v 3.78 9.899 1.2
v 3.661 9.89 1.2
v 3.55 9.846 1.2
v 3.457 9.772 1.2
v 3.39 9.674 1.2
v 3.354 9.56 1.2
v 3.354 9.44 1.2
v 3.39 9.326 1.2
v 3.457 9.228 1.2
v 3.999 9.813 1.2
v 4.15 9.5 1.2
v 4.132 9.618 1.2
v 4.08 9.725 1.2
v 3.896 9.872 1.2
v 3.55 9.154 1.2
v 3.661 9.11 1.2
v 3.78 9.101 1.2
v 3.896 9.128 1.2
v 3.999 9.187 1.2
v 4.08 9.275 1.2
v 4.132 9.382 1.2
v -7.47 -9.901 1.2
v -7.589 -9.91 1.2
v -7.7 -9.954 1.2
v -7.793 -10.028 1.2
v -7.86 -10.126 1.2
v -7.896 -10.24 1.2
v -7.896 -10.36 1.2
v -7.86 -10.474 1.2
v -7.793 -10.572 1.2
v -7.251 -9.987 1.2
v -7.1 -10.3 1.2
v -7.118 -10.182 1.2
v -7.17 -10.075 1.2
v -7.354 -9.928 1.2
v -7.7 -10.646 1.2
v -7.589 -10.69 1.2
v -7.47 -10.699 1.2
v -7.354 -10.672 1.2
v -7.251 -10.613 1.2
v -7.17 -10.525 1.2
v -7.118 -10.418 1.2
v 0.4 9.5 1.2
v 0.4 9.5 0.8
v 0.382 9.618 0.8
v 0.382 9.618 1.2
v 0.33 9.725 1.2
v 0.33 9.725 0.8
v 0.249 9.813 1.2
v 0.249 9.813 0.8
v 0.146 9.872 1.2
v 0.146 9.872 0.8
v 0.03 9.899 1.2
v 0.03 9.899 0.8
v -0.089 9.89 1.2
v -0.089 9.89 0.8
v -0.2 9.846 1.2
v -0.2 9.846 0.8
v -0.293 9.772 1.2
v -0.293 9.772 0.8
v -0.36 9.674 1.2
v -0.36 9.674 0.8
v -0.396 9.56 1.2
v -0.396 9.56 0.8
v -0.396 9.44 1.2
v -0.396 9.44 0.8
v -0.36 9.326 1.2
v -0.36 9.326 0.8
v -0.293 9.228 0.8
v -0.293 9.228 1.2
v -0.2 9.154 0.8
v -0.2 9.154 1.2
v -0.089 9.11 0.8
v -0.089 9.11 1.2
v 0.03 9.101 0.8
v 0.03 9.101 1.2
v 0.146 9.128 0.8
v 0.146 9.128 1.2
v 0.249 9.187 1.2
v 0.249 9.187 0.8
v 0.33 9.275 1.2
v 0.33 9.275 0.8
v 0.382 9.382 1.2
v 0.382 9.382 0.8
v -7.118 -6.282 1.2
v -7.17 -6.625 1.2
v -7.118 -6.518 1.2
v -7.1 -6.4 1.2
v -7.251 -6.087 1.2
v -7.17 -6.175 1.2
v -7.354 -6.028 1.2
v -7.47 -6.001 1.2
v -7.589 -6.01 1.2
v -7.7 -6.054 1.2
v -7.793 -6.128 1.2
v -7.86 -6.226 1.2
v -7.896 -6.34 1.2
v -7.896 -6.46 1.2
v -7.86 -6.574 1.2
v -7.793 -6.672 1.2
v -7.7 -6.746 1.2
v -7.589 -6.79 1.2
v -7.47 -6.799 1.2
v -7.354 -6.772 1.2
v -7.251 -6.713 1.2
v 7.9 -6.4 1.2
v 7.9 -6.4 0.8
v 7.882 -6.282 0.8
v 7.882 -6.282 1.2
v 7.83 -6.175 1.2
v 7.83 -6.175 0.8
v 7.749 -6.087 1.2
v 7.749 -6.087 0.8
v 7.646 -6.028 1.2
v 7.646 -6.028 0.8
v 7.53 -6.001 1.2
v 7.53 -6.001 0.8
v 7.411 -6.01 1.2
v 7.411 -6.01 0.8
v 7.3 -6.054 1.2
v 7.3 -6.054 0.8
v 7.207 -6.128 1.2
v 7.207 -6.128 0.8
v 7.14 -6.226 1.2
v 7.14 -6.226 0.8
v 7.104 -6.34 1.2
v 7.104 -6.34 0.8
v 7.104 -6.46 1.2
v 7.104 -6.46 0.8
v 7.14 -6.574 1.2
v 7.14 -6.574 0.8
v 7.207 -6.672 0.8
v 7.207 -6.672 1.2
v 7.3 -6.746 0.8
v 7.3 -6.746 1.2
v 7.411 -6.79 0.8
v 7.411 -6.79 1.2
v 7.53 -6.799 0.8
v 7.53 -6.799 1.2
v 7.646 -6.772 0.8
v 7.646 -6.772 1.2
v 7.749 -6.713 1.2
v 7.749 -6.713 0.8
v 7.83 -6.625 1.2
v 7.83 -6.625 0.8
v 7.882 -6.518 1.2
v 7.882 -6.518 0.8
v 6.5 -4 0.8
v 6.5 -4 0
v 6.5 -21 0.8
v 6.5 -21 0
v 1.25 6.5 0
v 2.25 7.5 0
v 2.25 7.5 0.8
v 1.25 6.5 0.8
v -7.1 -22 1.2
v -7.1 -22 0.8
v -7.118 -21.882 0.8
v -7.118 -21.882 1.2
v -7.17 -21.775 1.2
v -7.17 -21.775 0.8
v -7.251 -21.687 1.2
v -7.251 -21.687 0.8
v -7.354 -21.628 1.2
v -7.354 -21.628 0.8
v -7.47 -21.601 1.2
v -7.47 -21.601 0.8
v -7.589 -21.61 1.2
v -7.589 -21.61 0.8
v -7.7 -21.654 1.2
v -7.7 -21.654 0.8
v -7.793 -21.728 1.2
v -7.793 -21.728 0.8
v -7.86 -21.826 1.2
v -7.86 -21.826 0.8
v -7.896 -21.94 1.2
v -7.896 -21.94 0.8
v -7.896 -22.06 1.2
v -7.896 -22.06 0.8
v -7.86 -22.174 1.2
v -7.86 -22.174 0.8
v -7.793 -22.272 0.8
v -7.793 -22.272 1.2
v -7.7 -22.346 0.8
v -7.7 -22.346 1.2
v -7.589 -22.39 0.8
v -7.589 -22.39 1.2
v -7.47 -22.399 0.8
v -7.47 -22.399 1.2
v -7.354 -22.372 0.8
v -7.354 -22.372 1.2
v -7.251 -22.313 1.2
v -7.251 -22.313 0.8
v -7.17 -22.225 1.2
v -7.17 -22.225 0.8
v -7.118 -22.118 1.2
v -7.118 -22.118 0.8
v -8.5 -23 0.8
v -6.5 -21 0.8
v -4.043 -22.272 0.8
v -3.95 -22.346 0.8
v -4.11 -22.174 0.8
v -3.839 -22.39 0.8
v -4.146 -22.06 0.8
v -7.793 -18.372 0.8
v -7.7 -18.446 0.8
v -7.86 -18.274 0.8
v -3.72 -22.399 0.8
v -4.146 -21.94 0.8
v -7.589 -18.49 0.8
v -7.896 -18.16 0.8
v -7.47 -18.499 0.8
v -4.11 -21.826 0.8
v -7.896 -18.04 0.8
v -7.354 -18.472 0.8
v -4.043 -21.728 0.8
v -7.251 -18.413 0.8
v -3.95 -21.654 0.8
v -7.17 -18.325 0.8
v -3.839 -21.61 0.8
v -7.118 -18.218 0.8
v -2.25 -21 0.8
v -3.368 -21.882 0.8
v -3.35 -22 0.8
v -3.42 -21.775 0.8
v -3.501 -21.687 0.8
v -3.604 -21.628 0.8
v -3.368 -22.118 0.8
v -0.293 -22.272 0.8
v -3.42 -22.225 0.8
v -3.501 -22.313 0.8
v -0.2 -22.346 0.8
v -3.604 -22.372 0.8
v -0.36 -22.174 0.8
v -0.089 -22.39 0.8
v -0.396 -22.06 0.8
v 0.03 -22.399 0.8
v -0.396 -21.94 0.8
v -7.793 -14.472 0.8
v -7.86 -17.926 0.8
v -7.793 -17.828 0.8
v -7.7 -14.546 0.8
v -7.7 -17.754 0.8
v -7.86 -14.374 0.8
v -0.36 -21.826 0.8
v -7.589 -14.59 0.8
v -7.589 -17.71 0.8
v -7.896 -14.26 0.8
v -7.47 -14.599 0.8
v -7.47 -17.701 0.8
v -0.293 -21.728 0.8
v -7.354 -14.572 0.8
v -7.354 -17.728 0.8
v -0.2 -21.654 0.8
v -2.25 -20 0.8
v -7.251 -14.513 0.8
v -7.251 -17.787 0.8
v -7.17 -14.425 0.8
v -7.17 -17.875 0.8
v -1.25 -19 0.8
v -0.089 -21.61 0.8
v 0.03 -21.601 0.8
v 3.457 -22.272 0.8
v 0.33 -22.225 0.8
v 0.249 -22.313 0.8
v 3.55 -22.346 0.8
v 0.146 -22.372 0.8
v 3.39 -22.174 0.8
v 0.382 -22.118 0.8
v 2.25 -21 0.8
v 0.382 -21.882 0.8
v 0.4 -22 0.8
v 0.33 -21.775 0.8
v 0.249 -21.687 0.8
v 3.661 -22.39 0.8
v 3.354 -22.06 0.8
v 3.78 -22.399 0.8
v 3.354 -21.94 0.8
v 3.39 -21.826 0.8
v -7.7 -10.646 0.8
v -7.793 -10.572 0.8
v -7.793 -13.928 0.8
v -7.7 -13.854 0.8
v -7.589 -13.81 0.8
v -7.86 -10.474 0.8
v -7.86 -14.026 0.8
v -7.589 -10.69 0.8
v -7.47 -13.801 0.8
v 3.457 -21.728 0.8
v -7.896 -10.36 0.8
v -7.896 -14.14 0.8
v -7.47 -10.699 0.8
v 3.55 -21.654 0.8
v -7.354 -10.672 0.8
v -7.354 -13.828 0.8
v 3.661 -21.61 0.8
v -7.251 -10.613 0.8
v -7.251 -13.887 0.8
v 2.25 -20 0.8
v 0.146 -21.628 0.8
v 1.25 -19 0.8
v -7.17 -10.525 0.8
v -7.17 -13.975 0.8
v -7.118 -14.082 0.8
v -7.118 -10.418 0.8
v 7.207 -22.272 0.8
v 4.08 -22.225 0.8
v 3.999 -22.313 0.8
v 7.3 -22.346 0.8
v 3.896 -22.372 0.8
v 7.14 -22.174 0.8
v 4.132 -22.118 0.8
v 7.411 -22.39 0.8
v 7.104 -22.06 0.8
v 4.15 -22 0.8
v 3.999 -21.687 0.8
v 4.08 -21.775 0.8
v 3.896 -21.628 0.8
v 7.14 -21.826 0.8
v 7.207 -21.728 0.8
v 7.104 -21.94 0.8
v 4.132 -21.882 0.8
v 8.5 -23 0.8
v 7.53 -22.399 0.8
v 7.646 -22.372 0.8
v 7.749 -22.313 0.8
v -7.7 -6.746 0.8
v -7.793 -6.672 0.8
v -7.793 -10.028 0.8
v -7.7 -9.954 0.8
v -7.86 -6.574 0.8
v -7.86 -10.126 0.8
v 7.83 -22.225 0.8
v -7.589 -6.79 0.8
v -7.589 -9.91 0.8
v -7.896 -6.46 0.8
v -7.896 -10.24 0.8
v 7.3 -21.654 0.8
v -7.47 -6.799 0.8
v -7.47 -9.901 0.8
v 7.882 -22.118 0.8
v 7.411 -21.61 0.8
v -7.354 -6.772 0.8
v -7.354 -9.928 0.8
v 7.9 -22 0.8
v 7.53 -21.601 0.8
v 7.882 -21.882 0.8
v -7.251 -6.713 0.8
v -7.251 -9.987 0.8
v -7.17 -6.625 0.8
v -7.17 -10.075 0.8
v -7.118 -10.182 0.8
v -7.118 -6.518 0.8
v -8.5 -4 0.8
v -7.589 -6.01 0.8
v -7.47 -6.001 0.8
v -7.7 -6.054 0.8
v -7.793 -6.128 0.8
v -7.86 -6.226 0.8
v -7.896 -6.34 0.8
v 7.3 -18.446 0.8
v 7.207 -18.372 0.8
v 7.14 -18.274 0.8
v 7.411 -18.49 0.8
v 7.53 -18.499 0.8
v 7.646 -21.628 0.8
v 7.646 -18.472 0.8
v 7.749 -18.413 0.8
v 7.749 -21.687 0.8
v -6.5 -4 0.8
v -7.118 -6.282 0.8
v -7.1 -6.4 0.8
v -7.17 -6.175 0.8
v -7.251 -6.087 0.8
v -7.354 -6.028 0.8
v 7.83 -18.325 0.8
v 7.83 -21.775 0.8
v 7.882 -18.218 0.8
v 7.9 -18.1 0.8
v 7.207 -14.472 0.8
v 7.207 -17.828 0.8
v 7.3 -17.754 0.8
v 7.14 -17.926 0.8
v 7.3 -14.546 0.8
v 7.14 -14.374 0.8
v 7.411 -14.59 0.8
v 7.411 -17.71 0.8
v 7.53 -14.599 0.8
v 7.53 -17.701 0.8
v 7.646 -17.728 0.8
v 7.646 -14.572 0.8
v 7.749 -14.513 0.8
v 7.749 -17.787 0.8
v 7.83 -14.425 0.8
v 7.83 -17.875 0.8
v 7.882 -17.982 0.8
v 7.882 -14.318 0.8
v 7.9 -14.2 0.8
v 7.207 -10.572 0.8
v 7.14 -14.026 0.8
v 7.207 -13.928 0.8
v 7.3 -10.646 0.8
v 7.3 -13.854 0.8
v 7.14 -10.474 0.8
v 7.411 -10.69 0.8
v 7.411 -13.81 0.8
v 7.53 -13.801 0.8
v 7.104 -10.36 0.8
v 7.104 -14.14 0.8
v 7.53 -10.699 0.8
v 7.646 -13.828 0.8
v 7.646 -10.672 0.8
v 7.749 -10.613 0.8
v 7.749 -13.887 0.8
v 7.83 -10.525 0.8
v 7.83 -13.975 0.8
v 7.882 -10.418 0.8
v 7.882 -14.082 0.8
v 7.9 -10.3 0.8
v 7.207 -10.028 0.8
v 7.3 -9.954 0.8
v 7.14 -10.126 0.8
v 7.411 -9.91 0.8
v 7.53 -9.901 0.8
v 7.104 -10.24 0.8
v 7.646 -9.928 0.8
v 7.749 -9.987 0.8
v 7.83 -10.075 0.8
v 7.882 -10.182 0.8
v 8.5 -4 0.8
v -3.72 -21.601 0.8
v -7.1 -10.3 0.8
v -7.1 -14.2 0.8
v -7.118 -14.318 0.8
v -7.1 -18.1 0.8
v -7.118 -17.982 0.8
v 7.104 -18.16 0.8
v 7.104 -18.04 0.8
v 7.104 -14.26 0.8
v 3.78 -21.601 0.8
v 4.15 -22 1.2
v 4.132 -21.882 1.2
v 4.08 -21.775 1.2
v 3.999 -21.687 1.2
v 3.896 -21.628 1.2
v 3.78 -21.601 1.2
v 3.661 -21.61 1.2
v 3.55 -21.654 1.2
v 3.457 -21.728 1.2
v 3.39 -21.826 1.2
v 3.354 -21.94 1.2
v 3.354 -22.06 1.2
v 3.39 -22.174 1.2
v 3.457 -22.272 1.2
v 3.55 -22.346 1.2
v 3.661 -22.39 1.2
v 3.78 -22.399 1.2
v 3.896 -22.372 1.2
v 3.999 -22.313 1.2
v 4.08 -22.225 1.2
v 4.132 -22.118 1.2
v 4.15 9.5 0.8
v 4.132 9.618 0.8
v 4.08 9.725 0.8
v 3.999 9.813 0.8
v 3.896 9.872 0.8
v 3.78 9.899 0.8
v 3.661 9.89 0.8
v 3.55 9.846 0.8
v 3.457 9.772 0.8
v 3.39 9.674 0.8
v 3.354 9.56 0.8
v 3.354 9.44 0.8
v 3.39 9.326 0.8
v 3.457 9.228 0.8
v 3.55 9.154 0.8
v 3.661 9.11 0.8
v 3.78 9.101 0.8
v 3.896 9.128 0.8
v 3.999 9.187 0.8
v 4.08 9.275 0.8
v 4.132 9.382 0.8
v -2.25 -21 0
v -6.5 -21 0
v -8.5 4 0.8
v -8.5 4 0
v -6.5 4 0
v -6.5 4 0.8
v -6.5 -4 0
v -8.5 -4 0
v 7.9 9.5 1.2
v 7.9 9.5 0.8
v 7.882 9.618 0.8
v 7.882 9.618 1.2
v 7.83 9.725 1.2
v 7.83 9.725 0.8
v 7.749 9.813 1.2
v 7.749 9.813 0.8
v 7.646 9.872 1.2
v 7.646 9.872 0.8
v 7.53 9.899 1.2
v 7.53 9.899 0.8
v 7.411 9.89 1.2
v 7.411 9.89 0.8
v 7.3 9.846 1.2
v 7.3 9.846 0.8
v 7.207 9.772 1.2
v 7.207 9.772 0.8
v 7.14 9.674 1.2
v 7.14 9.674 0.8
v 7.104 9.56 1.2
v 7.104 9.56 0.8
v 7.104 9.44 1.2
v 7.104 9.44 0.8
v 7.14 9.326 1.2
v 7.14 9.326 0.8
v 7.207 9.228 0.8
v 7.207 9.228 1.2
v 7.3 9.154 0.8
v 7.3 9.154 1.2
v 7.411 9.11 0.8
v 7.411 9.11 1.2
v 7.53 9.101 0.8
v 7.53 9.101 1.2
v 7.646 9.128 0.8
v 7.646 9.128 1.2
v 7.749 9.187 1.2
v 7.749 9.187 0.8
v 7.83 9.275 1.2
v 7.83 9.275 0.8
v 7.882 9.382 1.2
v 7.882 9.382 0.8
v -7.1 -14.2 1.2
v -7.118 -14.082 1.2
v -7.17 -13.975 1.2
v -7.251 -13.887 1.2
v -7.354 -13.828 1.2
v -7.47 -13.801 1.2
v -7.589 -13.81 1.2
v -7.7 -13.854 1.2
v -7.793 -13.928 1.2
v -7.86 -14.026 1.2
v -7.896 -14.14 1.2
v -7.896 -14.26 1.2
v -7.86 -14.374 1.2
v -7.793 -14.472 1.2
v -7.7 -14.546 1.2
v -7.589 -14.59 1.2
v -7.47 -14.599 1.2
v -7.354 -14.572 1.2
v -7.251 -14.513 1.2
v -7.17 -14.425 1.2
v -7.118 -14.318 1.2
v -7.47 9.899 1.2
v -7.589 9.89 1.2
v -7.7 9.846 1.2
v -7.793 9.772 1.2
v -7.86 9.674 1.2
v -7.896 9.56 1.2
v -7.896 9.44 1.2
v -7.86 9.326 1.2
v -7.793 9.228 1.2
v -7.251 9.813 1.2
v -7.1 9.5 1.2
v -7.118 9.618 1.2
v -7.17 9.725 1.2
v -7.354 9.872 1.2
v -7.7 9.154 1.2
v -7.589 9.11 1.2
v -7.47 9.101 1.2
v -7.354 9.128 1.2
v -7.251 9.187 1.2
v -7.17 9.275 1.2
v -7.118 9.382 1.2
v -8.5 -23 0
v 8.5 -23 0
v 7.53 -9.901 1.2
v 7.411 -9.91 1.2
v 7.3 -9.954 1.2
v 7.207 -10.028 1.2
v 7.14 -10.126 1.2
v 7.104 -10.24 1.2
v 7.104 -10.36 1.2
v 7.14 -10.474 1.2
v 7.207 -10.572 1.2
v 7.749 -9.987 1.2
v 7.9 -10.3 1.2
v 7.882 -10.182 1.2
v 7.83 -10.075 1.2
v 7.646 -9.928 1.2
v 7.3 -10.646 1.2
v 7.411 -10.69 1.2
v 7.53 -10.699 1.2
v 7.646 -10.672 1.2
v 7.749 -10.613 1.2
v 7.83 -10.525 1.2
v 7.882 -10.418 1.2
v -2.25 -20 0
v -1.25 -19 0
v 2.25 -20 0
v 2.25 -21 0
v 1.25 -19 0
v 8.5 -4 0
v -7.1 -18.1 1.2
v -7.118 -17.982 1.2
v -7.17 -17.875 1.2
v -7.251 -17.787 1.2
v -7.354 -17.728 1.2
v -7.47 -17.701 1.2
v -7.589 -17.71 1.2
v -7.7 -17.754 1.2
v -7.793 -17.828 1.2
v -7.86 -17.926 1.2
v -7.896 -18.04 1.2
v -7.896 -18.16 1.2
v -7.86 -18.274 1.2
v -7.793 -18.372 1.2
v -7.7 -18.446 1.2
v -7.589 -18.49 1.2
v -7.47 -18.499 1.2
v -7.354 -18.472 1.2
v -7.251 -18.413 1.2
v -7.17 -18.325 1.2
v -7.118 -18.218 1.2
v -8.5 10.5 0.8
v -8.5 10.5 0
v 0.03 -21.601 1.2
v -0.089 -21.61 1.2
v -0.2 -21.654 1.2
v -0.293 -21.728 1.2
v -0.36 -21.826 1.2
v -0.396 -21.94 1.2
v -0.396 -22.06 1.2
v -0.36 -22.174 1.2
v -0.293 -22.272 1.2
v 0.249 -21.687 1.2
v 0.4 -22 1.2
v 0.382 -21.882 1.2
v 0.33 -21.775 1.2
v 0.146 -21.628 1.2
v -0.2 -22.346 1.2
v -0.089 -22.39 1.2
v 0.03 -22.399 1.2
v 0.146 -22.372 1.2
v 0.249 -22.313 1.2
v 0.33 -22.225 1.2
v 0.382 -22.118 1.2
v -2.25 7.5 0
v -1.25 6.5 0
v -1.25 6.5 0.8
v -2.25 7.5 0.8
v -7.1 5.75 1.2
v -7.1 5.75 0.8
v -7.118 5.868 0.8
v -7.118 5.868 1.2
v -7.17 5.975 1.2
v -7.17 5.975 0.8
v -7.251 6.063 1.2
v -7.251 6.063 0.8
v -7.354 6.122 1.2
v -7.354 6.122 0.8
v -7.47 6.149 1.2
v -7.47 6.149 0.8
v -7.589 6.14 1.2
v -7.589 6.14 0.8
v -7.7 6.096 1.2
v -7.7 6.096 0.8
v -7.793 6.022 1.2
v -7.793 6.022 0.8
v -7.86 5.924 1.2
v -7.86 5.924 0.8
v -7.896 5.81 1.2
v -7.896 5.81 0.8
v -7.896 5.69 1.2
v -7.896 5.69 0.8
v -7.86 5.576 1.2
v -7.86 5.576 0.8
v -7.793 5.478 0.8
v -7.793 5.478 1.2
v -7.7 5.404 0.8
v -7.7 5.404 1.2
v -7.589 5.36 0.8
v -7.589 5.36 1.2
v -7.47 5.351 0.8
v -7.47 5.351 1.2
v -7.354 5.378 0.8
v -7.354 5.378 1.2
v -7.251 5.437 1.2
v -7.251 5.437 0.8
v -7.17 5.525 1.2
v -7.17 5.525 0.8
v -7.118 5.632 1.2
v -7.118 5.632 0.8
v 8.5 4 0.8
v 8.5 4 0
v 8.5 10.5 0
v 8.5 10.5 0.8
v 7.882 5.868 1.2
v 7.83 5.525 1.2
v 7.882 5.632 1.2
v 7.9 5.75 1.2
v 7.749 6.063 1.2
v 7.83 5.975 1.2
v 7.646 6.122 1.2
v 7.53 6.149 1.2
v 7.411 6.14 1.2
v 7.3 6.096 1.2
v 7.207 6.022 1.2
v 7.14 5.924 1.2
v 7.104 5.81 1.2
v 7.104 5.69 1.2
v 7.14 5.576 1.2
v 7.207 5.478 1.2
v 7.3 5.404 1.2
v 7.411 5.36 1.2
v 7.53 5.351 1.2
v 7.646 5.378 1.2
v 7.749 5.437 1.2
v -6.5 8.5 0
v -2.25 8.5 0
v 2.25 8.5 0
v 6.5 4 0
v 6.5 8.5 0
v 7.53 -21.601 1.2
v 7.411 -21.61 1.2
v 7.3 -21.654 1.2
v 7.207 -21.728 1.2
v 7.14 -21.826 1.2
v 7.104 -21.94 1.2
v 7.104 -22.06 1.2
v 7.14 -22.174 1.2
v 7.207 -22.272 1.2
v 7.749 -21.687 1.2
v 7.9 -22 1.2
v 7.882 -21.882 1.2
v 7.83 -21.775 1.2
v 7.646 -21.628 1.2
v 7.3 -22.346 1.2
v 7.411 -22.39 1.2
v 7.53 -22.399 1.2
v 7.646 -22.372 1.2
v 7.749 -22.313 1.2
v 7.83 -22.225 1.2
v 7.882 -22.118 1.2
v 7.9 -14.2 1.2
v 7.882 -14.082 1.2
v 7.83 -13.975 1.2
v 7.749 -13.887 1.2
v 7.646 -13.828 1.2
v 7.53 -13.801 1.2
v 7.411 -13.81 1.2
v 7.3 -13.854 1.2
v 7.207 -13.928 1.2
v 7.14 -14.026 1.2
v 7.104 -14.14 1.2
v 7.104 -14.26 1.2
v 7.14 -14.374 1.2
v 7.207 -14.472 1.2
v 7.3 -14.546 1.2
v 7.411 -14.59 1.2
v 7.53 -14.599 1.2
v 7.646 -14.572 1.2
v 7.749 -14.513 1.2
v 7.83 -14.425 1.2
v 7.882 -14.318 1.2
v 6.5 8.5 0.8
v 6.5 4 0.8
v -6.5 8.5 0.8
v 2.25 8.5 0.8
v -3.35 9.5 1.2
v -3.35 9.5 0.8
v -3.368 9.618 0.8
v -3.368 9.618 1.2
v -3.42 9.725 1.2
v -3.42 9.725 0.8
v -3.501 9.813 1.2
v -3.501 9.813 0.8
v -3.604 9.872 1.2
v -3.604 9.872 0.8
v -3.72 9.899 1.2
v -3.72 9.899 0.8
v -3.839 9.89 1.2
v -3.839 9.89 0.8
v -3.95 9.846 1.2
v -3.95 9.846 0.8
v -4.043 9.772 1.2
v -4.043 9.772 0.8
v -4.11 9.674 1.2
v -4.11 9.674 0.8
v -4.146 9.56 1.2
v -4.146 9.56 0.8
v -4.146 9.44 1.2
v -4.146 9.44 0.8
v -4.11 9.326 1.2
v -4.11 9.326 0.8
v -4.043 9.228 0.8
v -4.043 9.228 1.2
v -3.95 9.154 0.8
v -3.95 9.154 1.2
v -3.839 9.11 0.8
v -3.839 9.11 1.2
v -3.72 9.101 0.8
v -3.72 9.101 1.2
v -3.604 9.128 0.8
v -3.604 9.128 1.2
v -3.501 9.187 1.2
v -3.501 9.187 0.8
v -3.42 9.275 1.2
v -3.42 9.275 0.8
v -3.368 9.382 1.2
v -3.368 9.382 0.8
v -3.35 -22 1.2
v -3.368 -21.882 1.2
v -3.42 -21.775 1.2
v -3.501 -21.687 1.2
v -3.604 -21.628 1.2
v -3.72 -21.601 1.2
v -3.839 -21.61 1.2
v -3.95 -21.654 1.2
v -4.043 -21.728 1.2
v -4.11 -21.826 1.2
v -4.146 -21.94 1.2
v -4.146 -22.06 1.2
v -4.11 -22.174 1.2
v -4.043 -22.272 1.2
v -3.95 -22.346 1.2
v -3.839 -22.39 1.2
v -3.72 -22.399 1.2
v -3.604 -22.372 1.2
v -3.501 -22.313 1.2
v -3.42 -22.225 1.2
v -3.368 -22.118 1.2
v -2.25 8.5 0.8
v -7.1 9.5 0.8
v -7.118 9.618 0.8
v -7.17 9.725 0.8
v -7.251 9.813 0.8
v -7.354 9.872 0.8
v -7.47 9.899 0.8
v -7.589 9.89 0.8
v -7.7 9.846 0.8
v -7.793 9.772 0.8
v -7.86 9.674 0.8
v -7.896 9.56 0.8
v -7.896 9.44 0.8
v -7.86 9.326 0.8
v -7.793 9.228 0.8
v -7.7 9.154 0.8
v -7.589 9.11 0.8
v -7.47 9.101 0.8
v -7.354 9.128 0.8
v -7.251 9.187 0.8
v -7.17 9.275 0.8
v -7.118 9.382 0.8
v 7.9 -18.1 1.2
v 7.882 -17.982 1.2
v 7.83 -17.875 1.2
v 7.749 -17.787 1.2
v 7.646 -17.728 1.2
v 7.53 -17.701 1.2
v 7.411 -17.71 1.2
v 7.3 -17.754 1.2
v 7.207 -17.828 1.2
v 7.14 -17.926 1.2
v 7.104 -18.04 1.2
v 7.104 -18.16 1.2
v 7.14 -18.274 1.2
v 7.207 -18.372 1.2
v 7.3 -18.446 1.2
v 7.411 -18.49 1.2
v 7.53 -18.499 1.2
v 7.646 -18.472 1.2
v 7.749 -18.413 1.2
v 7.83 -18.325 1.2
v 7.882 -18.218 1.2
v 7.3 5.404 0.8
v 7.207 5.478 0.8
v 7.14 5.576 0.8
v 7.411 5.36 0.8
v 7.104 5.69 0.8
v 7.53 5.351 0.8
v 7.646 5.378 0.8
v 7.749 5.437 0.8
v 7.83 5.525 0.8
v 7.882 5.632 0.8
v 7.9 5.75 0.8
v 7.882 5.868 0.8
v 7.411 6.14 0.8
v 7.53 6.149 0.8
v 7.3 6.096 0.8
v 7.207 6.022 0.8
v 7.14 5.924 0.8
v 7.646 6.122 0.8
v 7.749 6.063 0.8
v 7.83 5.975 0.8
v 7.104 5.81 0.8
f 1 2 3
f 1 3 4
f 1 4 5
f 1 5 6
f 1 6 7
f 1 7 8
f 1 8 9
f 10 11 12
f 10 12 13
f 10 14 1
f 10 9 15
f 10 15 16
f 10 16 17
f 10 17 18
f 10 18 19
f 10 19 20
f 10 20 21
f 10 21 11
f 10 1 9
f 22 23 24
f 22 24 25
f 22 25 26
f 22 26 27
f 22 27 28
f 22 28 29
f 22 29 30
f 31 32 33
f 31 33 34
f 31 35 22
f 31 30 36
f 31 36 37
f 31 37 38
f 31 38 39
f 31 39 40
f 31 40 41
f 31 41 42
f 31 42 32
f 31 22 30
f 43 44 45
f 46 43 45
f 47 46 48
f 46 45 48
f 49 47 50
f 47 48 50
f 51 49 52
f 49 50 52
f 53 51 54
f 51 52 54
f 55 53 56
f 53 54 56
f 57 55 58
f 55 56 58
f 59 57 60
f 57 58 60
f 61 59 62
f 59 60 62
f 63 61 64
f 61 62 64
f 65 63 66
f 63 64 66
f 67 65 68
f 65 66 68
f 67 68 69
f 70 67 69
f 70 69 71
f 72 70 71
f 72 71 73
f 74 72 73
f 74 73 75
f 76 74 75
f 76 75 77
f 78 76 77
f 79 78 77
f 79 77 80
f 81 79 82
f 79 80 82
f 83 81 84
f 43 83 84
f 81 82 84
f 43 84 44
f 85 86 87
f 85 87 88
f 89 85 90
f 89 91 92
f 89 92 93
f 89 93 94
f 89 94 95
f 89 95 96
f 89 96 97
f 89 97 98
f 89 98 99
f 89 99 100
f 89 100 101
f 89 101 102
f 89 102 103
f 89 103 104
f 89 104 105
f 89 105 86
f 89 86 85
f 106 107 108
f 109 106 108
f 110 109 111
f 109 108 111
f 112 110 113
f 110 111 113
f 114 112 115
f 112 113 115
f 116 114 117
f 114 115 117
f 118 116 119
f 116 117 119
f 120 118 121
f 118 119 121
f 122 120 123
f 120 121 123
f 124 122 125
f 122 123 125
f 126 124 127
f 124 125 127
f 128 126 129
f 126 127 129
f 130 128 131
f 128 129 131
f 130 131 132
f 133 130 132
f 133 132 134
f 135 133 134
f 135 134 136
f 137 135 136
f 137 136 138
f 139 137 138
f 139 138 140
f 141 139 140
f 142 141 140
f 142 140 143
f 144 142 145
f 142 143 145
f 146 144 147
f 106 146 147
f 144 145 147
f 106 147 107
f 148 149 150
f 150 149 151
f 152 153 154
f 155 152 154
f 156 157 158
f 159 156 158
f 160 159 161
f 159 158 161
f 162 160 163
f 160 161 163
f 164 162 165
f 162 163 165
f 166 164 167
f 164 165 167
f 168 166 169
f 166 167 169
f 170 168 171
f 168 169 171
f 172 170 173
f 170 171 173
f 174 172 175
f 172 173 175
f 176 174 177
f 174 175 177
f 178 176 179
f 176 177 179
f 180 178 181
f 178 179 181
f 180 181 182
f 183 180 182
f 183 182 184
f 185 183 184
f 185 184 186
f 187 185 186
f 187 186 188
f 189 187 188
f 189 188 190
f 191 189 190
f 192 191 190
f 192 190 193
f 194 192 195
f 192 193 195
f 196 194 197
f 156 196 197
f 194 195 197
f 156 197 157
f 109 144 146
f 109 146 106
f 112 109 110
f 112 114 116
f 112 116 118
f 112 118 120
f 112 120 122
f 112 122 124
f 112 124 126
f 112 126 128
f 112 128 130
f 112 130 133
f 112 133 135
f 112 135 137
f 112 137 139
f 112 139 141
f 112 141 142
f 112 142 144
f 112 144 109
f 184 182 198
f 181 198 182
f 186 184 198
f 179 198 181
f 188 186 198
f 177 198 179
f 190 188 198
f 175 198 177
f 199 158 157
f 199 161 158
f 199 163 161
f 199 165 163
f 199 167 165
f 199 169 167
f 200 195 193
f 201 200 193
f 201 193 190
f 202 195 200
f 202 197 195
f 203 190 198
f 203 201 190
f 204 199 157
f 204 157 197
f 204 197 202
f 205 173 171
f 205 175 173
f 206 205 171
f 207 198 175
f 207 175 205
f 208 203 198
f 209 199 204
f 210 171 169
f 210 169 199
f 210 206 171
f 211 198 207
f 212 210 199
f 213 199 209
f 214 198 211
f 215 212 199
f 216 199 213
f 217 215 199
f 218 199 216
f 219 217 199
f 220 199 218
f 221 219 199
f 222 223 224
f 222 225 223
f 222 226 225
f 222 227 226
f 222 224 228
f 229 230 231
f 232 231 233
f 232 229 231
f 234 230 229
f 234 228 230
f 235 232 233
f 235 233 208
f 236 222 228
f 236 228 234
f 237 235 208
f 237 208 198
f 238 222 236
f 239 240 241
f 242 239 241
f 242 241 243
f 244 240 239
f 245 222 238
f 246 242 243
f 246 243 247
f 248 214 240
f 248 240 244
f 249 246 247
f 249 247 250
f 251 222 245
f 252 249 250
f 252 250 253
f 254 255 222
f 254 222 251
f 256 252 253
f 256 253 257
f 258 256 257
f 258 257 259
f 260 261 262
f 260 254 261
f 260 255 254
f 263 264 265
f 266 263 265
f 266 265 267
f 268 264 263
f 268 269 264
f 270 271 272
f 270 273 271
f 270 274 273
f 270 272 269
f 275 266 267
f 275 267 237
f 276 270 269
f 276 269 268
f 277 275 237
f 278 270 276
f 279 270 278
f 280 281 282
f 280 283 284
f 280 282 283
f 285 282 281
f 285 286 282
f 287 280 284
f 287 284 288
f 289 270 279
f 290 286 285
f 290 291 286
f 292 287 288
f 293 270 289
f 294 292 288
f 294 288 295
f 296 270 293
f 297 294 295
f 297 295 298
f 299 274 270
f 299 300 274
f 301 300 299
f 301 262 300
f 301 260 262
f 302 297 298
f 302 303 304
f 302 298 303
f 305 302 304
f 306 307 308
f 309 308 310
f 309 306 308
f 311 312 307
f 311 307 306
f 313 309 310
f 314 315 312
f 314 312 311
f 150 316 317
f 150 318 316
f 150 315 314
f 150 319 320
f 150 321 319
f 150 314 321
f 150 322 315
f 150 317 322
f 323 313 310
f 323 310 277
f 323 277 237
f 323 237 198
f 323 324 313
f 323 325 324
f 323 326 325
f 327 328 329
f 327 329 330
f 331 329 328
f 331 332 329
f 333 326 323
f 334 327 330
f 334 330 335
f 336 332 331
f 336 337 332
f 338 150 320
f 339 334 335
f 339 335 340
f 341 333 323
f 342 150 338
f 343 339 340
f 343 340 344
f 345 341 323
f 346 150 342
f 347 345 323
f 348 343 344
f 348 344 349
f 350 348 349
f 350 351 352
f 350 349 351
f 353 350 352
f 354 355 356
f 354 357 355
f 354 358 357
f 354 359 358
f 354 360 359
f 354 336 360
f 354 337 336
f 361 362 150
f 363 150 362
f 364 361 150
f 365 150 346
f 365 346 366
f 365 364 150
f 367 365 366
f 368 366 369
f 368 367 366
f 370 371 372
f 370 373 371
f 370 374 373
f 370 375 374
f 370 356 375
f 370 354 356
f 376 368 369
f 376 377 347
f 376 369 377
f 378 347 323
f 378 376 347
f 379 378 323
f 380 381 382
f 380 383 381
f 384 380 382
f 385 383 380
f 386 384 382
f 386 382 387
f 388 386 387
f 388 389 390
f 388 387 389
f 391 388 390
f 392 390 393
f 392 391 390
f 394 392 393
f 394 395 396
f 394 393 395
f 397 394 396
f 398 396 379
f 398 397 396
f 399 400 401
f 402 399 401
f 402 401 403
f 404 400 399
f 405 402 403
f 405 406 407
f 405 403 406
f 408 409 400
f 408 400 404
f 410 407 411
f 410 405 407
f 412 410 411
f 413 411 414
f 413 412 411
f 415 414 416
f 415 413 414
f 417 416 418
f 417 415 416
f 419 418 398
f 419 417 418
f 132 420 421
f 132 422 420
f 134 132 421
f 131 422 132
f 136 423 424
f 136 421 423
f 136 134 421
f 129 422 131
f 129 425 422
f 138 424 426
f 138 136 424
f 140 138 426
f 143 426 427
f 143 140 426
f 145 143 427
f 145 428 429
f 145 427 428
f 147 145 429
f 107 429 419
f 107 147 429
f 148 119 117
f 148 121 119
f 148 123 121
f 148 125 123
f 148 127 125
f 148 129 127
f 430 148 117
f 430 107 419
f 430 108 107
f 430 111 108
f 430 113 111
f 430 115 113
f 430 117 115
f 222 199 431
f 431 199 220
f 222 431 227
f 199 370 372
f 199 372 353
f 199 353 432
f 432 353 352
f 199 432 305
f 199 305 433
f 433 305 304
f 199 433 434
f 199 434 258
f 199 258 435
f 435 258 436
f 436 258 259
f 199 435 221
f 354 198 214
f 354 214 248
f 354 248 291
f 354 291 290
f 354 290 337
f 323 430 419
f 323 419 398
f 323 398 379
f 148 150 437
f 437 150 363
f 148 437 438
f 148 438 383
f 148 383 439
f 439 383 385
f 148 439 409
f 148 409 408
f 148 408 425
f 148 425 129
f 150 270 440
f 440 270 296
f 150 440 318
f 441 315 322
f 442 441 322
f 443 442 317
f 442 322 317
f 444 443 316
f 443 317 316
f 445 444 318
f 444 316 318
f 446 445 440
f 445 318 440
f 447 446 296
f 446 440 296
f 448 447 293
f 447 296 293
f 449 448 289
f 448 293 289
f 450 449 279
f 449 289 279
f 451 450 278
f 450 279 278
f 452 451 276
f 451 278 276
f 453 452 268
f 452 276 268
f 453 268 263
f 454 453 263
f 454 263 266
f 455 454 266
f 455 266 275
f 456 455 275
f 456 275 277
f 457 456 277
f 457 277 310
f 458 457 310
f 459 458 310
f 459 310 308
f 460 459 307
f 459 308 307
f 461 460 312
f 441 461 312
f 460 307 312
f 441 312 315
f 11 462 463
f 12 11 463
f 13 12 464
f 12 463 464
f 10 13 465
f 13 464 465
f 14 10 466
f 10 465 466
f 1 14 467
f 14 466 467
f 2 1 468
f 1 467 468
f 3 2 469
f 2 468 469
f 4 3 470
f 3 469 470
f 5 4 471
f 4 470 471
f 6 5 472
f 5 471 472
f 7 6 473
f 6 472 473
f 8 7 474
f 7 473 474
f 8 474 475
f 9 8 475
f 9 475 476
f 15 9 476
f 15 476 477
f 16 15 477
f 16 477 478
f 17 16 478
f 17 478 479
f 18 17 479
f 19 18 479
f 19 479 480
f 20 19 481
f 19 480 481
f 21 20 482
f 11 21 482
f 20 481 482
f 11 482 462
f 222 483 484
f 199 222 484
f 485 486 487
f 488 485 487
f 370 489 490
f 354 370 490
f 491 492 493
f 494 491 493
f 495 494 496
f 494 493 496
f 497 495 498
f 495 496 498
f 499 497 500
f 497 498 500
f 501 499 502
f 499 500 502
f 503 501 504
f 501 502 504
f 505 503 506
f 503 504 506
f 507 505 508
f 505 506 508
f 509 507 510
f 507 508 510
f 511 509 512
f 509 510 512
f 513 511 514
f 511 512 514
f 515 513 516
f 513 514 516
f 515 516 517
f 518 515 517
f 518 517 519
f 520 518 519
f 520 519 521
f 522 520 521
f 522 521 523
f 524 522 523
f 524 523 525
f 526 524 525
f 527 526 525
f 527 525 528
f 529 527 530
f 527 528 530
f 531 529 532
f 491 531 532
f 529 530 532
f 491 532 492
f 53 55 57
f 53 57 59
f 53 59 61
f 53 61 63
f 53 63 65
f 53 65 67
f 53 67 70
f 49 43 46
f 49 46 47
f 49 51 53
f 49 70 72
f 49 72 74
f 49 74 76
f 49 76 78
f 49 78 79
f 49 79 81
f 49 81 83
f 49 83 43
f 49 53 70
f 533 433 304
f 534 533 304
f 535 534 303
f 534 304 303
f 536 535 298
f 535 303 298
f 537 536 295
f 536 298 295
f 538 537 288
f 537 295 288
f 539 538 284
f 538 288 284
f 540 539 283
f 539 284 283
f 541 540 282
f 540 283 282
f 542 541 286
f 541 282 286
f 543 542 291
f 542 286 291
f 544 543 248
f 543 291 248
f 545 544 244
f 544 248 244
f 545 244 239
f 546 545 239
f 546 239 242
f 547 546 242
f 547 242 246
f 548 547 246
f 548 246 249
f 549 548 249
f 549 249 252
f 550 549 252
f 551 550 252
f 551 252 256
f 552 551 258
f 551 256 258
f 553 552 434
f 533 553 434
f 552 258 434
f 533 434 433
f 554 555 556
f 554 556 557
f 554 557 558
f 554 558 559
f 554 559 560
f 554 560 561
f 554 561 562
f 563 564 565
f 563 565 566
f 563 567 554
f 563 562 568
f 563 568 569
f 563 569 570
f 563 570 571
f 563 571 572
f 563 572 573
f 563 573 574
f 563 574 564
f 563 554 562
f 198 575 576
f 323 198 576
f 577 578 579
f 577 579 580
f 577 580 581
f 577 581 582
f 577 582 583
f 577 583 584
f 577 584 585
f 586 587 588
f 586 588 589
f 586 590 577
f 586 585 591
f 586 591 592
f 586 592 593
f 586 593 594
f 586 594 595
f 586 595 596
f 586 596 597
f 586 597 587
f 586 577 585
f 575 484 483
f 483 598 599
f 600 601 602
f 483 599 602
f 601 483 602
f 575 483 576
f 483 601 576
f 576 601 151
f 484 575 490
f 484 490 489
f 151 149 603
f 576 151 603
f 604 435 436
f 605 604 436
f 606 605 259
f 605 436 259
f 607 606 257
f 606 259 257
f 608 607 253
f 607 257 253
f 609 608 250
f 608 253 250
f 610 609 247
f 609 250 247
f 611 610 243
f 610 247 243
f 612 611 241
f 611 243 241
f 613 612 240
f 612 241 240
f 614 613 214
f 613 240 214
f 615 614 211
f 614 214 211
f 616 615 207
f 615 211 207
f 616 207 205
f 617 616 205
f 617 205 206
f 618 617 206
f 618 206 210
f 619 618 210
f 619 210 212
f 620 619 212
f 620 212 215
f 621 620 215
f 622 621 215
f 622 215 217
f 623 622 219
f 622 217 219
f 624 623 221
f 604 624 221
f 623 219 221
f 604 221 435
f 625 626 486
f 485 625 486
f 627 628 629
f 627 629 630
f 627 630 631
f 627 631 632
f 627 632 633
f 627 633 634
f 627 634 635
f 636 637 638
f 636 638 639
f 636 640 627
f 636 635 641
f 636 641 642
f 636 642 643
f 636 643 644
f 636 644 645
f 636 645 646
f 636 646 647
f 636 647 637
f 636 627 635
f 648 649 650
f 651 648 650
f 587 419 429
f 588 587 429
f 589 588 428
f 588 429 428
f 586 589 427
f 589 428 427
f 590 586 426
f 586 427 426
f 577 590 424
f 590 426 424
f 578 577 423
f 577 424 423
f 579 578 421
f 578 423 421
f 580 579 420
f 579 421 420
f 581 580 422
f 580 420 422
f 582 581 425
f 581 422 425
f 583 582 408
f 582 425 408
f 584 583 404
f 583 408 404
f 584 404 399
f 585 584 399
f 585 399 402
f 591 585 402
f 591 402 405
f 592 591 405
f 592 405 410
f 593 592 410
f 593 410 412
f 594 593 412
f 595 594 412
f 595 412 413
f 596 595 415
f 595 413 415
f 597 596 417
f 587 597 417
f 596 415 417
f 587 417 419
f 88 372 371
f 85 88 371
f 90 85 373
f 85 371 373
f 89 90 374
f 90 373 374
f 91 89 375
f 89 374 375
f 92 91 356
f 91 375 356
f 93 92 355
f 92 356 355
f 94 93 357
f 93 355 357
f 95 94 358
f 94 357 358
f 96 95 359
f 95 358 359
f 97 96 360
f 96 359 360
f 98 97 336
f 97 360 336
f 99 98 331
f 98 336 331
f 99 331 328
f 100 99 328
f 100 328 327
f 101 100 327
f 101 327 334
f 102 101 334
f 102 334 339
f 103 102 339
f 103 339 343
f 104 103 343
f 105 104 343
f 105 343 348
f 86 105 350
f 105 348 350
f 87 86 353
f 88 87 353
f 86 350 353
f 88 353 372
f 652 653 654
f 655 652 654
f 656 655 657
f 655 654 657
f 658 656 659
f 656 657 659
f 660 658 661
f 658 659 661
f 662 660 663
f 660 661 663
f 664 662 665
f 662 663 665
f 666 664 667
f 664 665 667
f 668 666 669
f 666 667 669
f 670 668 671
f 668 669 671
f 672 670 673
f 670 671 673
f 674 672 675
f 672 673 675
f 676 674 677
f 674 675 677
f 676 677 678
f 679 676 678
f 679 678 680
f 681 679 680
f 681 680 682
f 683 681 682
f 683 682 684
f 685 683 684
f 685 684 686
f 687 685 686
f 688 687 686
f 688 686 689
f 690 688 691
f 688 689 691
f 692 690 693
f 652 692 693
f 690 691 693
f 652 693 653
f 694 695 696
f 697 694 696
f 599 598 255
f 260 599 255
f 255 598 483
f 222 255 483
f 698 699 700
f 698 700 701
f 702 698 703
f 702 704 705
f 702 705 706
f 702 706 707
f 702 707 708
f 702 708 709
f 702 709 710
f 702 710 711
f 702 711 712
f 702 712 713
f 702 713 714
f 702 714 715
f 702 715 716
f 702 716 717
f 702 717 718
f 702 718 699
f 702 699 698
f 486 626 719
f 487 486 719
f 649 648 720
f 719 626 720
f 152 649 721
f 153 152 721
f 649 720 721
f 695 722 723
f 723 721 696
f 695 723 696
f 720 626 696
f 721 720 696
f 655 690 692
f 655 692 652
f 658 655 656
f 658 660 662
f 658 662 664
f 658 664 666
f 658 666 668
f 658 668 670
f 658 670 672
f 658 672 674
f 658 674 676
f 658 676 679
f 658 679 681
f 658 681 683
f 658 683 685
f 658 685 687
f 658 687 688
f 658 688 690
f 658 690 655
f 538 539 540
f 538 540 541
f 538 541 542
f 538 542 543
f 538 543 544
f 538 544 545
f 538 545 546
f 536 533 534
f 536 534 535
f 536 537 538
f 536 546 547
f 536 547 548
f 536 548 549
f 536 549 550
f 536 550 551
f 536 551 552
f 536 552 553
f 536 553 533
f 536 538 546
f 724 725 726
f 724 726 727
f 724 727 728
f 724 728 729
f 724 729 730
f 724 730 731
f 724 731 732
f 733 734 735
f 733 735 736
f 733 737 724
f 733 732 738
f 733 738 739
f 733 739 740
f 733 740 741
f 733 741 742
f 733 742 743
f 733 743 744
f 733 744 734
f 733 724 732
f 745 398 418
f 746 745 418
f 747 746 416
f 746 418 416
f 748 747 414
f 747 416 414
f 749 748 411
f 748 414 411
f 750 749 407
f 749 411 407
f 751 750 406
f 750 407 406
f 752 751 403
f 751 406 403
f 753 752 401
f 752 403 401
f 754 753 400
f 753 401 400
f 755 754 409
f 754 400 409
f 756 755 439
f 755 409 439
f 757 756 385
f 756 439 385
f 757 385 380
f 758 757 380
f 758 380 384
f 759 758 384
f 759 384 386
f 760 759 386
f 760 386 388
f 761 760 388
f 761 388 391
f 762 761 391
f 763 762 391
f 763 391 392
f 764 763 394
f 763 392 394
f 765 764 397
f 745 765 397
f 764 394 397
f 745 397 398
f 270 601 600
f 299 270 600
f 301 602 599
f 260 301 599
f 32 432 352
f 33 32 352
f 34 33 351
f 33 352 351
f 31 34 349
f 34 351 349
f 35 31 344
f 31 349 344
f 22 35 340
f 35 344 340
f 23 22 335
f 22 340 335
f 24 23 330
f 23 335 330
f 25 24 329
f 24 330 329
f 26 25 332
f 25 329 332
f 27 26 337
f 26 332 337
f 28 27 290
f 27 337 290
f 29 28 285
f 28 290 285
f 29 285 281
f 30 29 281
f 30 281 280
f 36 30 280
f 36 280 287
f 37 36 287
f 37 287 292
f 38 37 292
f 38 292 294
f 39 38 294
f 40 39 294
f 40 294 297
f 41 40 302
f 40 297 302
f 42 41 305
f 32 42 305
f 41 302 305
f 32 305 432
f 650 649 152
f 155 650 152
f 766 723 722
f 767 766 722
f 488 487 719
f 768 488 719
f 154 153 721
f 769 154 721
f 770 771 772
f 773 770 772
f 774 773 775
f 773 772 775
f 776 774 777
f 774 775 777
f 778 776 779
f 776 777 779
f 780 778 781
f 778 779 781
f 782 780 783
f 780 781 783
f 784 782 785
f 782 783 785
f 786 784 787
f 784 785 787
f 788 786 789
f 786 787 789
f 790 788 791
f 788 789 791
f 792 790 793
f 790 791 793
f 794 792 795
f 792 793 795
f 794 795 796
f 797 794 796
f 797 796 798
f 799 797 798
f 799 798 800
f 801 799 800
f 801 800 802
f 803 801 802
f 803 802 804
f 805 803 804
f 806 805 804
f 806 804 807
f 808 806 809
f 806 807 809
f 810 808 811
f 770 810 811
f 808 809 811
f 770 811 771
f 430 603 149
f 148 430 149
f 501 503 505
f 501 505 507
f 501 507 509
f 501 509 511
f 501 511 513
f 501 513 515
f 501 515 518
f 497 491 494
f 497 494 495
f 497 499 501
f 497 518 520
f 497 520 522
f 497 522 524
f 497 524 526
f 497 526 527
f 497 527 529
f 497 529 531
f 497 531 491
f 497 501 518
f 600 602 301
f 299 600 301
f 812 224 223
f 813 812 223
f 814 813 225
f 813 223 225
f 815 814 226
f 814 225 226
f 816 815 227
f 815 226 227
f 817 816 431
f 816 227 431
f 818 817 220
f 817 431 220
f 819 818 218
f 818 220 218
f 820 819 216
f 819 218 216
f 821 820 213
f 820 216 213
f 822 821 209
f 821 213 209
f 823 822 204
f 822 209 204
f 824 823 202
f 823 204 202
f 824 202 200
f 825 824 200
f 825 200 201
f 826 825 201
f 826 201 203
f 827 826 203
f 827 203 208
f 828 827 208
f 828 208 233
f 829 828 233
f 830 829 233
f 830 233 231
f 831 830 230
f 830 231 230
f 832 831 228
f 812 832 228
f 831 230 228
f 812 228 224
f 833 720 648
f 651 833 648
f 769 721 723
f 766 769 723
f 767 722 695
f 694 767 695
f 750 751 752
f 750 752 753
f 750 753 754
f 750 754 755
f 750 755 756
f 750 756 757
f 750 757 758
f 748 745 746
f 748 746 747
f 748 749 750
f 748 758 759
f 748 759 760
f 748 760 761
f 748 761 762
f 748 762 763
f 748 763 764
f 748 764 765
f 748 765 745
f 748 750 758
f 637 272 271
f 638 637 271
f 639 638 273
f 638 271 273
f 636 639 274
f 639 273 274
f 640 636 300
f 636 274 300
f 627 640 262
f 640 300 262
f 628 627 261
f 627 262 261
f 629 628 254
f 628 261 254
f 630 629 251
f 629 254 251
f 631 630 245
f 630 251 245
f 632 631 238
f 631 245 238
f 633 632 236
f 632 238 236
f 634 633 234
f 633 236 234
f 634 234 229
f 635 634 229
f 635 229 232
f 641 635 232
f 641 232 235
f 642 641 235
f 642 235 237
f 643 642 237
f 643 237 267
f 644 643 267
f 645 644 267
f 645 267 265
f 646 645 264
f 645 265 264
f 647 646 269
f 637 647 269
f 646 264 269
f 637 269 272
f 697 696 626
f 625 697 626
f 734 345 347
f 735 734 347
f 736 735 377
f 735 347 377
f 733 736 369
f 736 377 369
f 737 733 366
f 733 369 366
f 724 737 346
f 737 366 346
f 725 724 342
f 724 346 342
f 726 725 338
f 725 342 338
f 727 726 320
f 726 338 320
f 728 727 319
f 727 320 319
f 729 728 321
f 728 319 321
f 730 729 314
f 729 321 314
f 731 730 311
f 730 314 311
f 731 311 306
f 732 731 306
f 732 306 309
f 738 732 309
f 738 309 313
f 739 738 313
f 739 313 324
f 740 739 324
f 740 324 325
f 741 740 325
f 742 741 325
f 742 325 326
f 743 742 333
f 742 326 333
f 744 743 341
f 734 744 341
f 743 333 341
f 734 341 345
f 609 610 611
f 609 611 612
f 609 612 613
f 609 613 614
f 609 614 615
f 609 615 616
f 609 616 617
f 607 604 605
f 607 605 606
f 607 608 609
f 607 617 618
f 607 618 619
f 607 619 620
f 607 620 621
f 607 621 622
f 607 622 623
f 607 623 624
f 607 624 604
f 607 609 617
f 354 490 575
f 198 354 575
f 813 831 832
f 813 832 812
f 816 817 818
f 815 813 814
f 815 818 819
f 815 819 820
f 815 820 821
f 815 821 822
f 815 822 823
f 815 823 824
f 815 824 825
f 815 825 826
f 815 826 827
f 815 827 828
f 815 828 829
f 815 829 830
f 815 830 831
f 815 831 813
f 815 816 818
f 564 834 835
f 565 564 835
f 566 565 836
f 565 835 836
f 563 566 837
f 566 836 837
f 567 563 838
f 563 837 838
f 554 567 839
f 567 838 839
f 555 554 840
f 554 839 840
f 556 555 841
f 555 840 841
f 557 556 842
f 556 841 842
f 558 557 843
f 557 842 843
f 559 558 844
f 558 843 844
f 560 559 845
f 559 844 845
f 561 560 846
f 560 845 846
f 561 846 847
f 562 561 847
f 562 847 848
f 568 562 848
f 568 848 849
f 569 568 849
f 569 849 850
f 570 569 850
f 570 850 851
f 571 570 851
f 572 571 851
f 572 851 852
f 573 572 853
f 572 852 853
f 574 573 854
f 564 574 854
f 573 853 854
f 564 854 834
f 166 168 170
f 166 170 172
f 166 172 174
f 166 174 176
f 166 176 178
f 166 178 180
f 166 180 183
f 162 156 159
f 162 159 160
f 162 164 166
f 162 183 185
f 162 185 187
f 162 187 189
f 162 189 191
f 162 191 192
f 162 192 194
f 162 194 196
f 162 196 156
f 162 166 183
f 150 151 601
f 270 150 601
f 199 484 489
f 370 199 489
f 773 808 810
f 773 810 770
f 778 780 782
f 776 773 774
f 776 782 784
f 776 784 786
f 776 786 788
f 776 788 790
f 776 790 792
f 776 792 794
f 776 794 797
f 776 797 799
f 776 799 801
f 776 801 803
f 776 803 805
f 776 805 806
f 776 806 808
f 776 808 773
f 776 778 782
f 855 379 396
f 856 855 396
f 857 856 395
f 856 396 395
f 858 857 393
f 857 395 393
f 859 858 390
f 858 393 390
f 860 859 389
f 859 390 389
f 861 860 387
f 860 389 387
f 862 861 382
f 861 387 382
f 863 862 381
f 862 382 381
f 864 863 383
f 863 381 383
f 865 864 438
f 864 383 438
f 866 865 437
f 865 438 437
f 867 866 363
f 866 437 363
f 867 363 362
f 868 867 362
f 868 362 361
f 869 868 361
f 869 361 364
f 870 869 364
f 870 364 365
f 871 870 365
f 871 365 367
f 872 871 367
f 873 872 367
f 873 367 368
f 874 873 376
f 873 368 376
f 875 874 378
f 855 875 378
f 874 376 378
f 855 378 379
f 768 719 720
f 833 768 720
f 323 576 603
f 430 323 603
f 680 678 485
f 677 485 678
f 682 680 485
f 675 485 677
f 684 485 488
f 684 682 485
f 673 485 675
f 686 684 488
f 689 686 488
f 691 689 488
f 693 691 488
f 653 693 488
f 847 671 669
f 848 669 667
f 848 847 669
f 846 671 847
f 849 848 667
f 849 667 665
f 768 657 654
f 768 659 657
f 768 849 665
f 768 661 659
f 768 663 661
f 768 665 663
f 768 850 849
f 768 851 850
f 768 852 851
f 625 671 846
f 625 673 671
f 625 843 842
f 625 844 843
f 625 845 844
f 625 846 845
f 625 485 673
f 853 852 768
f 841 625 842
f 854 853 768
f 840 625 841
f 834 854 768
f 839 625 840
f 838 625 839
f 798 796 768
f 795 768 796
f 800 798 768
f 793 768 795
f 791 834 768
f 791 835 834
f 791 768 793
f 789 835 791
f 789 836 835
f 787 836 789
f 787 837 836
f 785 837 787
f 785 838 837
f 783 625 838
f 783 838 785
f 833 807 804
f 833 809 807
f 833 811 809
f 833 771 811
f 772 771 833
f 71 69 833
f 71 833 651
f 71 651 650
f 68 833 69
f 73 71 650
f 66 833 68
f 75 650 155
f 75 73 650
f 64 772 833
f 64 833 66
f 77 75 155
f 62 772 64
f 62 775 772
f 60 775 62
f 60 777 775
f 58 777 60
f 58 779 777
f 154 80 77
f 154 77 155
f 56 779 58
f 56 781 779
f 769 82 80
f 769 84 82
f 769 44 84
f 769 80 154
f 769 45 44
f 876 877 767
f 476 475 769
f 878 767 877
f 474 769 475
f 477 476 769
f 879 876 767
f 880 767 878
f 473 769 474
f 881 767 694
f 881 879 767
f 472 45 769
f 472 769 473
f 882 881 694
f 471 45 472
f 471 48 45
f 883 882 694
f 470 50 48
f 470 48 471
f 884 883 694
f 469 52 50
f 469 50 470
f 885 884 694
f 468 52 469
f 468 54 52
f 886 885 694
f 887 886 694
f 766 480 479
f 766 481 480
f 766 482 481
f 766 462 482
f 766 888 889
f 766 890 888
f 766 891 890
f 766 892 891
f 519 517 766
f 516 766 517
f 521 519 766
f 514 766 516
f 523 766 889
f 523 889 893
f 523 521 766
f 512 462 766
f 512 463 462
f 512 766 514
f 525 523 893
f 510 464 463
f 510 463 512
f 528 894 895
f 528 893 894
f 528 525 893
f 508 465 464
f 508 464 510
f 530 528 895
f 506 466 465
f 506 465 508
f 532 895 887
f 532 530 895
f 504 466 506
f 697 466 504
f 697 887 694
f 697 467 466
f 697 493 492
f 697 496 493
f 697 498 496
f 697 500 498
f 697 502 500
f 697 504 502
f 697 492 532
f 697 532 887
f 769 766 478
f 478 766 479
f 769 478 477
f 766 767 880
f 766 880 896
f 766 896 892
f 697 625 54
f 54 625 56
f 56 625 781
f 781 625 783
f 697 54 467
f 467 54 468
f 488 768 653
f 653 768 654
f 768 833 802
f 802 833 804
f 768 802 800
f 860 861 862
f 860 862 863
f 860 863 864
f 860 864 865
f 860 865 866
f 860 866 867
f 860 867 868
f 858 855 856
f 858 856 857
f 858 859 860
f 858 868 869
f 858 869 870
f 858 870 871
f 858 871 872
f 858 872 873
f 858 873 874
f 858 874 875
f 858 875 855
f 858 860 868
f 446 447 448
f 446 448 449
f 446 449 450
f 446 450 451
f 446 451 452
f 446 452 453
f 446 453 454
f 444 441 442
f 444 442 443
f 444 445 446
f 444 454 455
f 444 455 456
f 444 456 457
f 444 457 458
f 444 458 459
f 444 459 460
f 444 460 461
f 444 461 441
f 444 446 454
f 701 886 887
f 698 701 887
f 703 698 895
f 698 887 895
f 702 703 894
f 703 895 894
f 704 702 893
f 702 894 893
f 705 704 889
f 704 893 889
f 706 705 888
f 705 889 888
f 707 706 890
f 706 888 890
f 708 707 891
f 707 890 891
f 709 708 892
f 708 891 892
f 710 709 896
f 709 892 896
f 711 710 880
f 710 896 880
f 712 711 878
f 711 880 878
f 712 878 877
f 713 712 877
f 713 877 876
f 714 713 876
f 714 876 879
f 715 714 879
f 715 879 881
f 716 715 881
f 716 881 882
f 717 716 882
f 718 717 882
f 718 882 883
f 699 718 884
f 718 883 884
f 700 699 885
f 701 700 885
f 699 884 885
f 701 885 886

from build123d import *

# Parameters (mm, degrees)
F1_DEPTH  = 0.8
F2_R      = 0.4
F3_DEPTH  = 0.4
F4_SIZE   = 1
F4_2_SIZE = 1


with BuildPart() as f1:
    # F0 (on Top) → F1 (new body)
    with BuildSketch(Plane.XY):
        Polygon((8.5, 10.5), (-8.5, 10.5), (-8.5, 4), (-6.5, 4), (-6.5, 8.5), (-2.25, 8.5), (-2.25, 6.5), (2.25, 6.5), (2.25, 8.5), (6.5, 8.5), (6.5, 4), (8.5, 4), align=None)
    extrude(amount=F1_DEPTH)

    # F2 (on face) → F3 (join)
    with BuildSketch(Plane.XY.offset(0.8)):
        with Locations((-7.5, 9.5)):
            Circle(F2_R)
        with Locations((-3.75, 9.5)):
            Circle(F2_R)
        with Locations((0, 9.5)):
            Circle(F2_R)
        with Locations((3.75, 9.5)):
            Circle(F2_R)
        with Locations((7.5, 9.5)):
            Circle(F2_R)
        with Locations((-7.5, 5.75)):
            Circle(F2_R)
        with Locations((7.5, 5.75)):
            Circle(F2_R)
    extrude(amount=F3_DEPTH)

    # F4
    f4_edges = [f1.edges().sort_by_distance(p)[0] for p in [
        (-2.25, 6.5, 0.4),
        (2.25, 6.5, 0.4),
    ]]
    chamfer(f4_edges, length=F4_SIZE)


with BuildPart() as f1b:
    # F0 (on Top) → F1, piece 2 (new body)
    with BuildSketch(Plane.XY):
        Polygon((-8.5, -4), (-8.5, -23), (8.5, -23), (8.5, -4), (6.5, -4), (6.5, -21), (2.25, -21), (2.25, -19), (-2.25, -19), (-2.25, -21), (-6.5, -21), (-6.5, -4), align=None)
    extrude(amount=F1_DEPTH)

    # F2 (on face) → F3, piece 2 (join)
    with BuildSketch(Plane.XY.offset(0.8)):
        with Locations((0, -22)):
            Circle(F2_R)
        with Locations((3.75, -22)):
            Circle(F2_R)
        with Locations((7.5, -22)):
            Circle(F2_R)
        with Locations((-3.75, -22)):
            Circle(F2_R)
        with Locations((-7.5, -22)):
            Circle(F2_R)
        with Locations((-7.5, -18.1)):
            Circle(F2_R)
        with Locations((-7.5, -14.2)):
            Circle(F2_R)
        with Locations((-7.5, -10.3)):
            Circle(F2_R)
        with Locations((-7.5, -6.4)):
            Circle(F2_R)
        with Locations((7.5, -18.1)):
            Circle(F2_R)
        with Locations((7.5, -14.2)):
            Circle(F2_R)
        with Locations((7.5, -10.3)):
            Circle(F2_R)
        with Locations((7.5, -6.4)):
            Circle(F2_R)
    extrude(amount=F3_DEPTH)

    # F4#2
    f4_2_edges = [f1b.edges().sort_by_distance(p)[0] for p in [
        (2.25, -19, 0.4),
        (-2.25, -19, 0.4),
    ]]
    chamfer(f4_2_edges, length=F4_2_SIZE)


solid = Compound([f1.part, f1b.part])
